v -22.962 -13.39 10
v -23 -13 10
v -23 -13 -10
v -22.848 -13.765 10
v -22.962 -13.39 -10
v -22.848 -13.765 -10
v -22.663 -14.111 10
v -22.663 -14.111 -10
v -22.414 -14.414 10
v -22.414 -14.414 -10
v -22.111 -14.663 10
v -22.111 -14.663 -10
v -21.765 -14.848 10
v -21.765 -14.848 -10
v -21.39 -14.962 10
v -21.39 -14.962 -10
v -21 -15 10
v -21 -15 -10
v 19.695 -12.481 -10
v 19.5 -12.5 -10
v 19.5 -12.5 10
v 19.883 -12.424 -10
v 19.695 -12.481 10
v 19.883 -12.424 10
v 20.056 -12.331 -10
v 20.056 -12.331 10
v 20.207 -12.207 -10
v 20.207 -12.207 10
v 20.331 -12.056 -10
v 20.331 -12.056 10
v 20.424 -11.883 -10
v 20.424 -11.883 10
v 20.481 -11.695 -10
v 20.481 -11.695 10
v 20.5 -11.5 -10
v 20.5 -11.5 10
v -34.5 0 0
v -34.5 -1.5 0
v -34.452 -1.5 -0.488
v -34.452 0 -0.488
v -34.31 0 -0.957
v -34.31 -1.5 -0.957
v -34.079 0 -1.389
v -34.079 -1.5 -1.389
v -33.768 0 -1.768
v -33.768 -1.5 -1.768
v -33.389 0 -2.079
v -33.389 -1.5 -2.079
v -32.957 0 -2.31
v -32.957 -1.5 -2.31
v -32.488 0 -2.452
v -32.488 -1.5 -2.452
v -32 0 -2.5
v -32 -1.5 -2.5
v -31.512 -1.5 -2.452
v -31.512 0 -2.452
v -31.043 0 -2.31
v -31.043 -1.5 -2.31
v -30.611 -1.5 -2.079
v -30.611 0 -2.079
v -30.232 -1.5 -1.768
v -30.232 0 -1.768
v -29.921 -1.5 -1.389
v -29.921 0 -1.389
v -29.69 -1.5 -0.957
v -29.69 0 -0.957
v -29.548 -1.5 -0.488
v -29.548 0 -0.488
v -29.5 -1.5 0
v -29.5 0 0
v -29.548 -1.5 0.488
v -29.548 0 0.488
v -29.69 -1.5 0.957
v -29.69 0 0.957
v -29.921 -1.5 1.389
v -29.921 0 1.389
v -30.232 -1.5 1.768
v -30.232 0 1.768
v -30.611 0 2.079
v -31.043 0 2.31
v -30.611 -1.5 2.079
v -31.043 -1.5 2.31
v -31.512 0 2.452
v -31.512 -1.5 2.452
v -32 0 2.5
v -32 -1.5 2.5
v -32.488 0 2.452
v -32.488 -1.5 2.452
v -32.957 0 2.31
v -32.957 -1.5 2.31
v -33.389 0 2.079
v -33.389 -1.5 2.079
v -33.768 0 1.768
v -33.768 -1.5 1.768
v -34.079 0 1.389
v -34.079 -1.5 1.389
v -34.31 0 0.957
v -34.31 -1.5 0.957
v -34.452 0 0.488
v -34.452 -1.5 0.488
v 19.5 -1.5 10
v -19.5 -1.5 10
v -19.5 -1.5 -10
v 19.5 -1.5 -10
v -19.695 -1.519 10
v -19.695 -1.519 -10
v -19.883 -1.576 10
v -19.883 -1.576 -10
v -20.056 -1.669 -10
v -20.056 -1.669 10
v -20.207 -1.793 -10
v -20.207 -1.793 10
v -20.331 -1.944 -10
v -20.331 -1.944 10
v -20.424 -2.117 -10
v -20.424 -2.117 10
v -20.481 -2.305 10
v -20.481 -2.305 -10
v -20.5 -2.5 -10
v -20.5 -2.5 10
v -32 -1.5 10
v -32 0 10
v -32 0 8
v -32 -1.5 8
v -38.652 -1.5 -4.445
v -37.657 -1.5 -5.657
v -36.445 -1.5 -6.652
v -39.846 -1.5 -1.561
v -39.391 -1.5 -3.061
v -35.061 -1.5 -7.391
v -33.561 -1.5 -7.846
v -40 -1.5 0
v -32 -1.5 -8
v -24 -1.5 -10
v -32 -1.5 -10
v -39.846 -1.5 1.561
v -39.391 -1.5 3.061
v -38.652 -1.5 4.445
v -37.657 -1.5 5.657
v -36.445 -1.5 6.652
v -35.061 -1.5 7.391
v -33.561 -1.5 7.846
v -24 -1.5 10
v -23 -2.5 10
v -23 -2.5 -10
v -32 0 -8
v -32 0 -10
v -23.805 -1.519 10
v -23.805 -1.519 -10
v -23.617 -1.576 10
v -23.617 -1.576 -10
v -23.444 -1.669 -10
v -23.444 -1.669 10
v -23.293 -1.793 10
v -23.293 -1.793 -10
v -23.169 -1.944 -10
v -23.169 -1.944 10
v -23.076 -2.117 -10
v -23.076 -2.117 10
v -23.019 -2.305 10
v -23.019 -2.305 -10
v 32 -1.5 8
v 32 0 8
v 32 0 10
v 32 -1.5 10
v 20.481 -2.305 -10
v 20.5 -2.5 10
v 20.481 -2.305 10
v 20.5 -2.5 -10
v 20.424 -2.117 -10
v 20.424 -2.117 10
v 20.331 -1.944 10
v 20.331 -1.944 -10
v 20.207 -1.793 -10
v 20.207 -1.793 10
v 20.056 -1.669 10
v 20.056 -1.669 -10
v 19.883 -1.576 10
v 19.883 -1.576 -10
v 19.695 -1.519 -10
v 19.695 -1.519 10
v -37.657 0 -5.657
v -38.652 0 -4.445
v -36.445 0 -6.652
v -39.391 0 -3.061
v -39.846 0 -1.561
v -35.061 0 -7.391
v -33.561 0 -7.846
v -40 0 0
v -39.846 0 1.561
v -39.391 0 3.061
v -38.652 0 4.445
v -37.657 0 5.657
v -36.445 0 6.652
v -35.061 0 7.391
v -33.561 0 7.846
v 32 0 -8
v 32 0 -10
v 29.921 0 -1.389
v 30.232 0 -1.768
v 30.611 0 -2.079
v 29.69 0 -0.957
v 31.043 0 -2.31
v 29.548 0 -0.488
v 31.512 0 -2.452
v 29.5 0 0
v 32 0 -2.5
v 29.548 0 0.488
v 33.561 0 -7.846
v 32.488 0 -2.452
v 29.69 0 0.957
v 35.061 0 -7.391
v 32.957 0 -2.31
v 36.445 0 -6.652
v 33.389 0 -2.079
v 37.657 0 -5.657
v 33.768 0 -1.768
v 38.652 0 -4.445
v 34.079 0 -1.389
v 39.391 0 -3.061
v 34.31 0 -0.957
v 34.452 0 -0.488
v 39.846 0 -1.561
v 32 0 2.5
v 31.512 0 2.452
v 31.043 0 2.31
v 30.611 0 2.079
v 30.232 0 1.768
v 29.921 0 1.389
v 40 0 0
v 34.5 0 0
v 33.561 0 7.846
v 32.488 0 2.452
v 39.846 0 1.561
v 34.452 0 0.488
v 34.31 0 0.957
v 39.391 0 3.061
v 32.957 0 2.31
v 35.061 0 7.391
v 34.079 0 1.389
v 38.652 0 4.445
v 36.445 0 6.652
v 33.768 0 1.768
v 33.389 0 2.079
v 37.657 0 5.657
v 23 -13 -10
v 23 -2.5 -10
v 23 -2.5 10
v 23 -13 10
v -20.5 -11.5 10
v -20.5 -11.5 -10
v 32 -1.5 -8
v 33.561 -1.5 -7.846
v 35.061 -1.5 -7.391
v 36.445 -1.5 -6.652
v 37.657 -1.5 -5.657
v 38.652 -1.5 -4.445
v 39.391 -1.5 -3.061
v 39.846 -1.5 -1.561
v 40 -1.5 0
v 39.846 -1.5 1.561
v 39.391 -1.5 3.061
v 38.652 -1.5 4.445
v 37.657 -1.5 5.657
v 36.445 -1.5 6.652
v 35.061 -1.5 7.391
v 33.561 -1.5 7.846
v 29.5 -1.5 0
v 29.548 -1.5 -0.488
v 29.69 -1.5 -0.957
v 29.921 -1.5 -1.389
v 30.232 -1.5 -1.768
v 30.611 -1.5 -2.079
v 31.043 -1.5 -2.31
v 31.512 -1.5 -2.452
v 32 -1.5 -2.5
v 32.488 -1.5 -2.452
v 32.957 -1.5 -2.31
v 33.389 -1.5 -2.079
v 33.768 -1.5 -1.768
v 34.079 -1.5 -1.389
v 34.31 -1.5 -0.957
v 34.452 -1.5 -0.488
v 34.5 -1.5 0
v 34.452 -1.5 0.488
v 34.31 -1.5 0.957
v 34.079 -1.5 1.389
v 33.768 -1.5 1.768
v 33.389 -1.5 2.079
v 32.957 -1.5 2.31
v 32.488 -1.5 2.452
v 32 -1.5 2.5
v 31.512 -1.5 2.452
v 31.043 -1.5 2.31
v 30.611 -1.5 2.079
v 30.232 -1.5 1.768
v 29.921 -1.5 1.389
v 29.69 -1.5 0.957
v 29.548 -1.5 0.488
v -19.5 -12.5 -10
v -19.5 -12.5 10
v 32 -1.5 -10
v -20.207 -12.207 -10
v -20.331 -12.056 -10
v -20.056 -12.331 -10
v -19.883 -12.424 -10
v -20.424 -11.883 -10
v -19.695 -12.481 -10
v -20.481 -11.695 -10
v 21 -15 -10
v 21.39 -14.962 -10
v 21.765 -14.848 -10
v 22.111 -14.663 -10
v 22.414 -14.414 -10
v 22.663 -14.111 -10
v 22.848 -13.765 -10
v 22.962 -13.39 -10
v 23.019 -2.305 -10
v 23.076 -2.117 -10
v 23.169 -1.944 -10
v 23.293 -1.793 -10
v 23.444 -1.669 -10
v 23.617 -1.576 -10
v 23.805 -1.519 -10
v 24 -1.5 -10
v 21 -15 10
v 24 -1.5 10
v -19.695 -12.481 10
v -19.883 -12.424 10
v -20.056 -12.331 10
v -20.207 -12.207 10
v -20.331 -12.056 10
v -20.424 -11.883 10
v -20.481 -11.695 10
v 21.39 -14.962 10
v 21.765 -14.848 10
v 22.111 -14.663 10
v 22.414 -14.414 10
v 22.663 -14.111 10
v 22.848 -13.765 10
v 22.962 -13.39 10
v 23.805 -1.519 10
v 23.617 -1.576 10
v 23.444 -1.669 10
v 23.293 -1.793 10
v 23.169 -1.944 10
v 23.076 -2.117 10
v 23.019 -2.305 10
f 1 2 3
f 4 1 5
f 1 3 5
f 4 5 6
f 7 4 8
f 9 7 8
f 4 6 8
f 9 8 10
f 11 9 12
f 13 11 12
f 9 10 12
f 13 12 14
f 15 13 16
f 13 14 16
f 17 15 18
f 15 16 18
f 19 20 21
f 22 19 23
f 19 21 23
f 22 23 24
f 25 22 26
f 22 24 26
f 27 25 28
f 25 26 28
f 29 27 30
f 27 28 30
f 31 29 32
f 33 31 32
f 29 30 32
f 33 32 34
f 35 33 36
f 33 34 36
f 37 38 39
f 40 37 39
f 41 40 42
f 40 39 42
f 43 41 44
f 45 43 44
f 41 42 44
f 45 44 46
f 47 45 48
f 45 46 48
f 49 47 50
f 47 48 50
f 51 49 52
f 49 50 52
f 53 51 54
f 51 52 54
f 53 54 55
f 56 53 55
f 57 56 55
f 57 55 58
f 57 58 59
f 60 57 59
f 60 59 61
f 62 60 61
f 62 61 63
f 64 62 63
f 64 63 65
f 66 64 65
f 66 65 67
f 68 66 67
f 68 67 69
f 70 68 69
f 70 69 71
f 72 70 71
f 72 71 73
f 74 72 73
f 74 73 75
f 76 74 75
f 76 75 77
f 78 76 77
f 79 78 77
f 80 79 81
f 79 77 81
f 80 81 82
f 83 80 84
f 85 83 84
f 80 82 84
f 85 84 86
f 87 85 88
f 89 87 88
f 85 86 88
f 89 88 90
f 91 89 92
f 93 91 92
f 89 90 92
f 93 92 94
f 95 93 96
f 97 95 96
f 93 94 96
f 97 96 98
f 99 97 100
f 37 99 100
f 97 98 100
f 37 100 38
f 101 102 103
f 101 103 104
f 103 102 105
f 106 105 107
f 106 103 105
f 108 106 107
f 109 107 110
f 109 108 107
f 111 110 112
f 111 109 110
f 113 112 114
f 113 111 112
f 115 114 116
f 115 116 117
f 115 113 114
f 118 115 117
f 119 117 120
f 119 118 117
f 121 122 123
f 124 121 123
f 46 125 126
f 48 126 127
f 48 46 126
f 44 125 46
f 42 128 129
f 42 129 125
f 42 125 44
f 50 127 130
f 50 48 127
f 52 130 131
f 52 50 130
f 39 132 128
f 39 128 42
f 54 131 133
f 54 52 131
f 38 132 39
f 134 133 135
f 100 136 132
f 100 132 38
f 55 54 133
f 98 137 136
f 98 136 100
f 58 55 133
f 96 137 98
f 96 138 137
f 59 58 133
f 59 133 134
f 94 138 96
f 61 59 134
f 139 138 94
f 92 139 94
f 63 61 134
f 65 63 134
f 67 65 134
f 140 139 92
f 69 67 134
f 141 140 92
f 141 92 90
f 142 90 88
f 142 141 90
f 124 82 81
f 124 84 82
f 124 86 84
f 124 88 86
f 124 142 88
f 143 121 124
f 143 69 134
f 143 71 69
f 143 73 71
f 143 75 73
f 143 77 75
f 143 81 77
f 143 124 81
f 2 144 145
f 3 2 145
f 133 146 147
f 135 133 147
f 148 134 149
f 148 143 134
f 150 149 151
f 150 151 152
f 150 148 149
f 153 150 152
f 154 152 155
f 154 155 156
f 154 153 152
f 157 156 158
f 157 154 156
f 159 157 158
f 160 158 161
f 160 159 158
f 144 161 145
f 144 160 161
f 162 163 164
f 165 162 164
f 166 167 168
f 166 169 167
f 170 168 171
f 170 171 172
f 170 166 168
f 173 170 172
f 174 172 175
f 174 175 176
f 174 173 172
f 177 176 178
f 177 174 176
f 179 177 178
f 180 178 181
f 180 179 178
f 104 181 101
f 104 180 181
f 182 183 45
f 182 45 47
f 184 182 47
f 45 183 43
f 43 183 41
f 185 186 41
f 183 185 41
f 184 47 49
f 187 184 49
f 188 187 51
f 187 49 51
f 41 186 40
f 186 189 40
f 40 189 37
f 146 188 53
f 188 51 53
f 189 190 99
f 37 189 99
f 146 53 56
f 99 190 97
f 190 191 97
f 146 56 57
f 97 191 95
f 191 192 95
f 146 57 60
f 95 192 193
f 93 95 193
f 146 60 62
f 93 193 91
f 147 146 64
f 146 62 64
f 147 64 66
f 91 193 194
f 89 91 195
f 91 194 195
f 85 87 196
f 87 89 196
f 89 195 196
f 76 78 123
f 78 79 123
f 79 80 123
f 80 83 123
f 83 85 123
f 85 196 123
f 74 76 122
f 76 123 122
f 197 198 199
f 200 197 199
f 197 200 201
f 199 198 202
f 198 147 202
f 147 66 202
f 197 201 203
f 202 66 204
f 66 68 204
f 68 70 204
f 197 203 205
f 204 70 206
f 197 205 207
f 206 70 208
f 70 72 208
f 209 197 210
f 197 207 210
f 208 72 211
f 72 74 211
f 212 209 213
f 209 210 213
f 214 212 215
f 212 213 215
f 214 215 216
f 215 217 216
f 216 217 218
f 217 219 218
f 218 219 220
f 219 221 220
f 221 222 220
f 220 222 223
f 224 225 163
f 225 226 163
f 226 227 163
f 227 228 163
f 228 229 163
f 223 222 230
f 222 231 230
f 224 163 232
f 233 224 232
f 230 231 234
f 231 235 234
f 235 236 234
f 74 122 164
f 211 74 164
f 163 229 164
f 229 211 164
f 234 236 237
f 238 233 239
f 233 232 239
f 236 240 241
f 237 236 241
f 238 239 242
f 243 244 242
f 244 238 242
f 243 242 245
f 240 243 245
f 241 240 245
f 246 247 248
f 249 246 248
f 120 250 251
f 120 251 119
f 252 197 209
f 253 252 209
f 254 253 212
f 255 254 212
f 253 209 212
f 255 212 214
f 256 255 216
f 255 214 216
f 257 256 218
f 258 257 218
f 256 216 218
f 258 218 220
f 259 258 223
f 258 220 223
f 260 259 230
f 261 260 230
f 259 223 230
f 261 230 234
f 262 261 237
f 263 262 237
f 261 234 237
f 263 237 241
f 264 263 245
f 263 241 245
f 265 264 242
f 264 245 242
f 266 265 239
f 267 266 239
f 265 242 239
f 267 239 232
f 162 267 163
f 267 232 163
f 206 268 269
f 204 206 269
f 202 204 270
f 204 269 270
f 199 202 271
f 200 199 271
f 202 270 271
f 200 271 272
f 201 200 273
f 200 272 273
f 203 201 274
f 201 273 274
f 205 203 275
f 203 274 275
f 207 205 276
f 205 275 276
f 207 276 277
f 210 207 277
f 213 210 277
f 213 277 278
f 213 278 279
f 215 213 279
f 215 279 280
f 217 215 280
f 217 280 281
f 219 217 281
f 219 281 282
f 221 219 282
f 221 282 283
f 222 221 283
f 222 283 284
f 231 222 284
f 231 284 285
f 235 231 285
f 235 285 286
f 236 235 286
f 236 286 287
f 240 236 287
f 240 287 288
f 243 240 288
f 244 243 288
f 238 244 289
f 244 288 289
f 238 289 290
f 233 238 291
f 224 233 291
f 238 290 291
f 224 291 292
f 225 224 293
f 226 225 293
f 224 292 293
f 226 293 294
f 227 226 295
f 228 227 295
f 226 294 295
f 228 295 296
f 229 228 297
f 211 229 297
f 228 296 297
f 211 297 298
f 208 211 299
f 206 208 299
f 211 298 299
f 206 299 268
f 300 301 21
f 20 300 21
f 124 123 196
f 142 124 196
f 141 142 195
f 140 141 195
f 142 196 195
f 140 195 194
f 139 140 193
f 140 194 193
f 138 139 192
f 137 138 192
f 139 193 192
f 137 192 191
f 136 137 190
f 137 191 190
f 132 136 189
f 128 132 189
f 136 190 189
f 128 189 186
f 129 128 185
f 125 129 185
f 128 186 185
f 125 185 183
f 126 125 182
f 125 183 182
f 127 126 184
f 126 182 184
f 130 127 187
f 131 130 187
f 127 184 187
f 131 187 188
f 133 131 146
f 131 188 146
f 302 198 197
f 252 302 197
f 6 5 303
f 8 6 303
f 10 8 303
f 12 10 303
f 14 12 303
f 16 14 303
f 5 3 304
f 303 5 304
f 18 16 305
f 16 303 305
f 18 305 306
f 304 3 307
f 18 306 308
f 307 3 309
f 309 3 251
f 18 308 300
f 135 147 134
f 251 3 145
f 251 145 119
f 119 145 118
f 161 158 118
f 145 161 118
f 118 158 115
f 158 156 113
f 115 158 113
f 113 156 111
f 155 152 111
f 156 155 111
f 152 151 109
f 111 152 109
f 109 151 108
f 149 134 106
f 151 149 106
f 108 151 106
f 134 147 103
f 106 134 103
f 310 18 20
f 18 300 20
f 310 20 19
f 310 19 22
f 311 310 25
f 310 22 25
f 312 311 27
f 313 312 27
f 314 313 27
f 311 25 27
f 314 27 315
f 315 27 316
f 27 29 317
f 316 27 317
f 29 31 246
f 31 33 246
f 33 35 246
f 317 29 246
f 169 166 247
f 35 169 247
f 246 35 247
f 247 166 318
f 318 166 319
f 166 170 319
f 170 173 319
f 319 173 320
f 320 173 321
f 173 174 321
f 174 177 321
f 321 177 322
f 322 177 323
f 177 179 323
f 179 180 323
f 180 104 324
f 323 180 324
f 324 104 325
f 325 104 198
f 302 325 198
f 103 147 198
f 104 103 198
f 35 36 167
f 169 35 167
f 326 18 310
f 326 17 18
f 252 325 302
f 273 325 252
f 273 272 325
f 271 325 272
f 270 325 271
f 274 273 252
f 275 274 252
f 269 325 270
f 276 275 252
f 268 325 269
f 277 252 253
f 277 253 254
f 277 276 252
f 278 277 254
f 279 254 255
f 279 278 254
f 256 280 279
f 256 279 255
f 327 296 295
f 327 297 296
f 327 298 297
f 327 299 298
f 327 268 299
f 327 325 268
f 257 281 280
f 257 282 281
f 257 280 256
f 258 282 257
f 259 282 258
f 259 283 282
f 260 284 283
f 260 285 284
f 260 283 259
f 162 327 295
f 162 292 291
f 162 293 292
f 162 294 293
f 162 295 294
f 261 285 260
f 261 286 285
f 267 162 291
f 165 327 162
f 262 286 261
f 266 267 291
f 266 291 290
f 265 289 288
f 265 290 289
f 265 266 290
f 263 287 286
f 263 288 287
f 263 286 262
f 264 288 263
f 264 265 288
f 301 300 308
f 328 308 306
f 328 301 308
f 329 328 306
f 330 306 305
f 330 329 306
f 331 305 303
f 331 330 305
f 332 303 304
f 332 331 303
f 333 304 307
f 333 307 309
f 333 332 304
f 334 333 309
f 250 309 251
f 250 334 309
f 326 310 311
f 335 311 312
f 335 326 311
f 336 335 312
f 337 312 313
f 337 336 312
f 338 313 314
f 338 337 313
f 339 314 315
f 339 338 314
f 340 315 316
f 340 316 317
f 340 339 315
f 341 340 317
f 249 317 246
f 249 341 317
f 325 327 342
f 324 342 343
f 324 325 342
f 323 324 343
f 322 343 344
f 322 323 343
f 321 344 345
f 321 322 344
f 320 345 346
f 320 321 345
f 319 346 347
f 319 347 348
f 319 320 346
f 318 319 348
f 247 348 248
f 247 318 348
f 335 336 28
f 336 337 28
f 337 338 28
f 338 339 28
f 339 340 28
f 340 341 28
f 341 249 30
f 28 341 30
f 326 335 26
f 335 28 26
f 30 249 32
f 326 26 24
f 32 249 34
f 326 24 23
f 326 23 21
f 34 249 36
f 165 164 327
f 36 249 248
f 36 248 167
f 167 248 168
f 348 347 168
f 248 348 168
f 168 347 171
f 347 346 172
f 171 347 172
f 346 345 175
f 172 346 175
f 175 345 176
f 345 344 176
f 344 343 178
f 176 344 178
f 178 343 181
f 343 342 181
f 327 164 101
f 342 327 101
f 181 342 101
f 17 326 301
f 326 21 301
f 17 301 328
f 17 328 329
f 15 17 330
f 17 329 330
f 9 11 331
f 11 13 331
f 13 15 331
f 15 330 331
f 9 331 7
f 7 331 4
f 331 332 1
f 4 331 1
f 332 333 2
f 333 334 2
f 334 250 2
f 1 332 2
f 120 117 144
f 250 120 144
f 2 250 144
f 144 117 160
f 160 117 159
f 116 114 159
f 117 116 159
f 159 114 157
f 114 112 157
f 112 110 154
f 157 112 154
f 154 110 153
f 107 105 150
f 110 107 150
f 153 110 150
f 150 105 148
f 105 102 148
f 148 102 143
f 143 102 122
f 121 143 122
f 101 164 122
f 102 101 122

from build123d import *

# Parameters (mm, degrees)
F0_W     = 46
F0_H     = 10
F1_DEPTH = 1.5
F2_DEPTH = 15
F3_W     = 41
F3_H     = 11
F4_DEPTH = 12.5
F5_D     = 5
F6_R     = 1
F7_R     = 2


with BuildPart() as f1:
    # F0 (on Front) → F1 (new body)
    with BuildSketch(Plane.XZ):
        with Locations((0, -5)):
            Rectangle(F0_W, F0_H)
        with Locations((0, 5)):
            Rectangle(F0_W, F0_H)
        Polygon((32, 10), (23, 10), (23, 0), (23, -10), (32, -10), (32, -8), (32, 8), align=None)
        with BuildLine():
            ThreePointArc((32, -8), (40, 0), (32, 8))
            Line((32, 8), (32, -8))
        make_face()
        Polygon((-23, 10), (-32, 10), (-32, 8), (-32, -8), (-32, -10), (-23, -10), (-23, 0), align=None)
        with BuildLine():
            Line((-32, -8), (-32, 8))
            ThreePointArc((-32, 8), (-40, 0), (-32, -8))
        make_face()
    extrude(amount=F1_DEPTH)

    # F0 (on Front) → F2 (join)
    with BuildSketch(Plane.XZ):
        with Locations((0, -5)):
            Rectangle(F0_W, F0_H)
        with Locations((0, 5)):
            Rectangle(F0_W, F0_H)
    extrude(amount=F2_DEPTH)

    # F3 (on Top) → F4 (cut, symmetric)
    with BuildSketch(Plane.XY):
        with Locations((0, -7)):
            Rectangle(F3_W, F3_H)
    extrude(amount=F4_DEPTH, both=True, mode=Mode.SUBTRACT)

    # F5 (through all)
    with Locations(Plane(origin=(0, 0, 0), x_dir=(1, 0, 0), z_dir=(0, 1, 0))):
        with Locations((-32, 0), (32, 0)):
            Hole(F5_D / 2)

    # F6
    f6_edges = [f1.edges().sort_by_distance(p)[0] for p in [
        (-23, -1.5, 0),
        (-20.5, -1.5, 0),
        (23, -1.5, 0),
        (20.5, -1.5, 0),
        (-20.5, -12.5, 0),
        (20.5, -12.5, 0),
    ]]
    fillet(f6_edges, radius=F6_R)

    # F7
    f7_edges = [f1.edges().sort_by_distance(p)[0] for p in [
        (-23, -15, 0),
        (23, -15, 0),
    ]]
    fillet(f7_edges, radius=F7_R)


solid = f1.part
